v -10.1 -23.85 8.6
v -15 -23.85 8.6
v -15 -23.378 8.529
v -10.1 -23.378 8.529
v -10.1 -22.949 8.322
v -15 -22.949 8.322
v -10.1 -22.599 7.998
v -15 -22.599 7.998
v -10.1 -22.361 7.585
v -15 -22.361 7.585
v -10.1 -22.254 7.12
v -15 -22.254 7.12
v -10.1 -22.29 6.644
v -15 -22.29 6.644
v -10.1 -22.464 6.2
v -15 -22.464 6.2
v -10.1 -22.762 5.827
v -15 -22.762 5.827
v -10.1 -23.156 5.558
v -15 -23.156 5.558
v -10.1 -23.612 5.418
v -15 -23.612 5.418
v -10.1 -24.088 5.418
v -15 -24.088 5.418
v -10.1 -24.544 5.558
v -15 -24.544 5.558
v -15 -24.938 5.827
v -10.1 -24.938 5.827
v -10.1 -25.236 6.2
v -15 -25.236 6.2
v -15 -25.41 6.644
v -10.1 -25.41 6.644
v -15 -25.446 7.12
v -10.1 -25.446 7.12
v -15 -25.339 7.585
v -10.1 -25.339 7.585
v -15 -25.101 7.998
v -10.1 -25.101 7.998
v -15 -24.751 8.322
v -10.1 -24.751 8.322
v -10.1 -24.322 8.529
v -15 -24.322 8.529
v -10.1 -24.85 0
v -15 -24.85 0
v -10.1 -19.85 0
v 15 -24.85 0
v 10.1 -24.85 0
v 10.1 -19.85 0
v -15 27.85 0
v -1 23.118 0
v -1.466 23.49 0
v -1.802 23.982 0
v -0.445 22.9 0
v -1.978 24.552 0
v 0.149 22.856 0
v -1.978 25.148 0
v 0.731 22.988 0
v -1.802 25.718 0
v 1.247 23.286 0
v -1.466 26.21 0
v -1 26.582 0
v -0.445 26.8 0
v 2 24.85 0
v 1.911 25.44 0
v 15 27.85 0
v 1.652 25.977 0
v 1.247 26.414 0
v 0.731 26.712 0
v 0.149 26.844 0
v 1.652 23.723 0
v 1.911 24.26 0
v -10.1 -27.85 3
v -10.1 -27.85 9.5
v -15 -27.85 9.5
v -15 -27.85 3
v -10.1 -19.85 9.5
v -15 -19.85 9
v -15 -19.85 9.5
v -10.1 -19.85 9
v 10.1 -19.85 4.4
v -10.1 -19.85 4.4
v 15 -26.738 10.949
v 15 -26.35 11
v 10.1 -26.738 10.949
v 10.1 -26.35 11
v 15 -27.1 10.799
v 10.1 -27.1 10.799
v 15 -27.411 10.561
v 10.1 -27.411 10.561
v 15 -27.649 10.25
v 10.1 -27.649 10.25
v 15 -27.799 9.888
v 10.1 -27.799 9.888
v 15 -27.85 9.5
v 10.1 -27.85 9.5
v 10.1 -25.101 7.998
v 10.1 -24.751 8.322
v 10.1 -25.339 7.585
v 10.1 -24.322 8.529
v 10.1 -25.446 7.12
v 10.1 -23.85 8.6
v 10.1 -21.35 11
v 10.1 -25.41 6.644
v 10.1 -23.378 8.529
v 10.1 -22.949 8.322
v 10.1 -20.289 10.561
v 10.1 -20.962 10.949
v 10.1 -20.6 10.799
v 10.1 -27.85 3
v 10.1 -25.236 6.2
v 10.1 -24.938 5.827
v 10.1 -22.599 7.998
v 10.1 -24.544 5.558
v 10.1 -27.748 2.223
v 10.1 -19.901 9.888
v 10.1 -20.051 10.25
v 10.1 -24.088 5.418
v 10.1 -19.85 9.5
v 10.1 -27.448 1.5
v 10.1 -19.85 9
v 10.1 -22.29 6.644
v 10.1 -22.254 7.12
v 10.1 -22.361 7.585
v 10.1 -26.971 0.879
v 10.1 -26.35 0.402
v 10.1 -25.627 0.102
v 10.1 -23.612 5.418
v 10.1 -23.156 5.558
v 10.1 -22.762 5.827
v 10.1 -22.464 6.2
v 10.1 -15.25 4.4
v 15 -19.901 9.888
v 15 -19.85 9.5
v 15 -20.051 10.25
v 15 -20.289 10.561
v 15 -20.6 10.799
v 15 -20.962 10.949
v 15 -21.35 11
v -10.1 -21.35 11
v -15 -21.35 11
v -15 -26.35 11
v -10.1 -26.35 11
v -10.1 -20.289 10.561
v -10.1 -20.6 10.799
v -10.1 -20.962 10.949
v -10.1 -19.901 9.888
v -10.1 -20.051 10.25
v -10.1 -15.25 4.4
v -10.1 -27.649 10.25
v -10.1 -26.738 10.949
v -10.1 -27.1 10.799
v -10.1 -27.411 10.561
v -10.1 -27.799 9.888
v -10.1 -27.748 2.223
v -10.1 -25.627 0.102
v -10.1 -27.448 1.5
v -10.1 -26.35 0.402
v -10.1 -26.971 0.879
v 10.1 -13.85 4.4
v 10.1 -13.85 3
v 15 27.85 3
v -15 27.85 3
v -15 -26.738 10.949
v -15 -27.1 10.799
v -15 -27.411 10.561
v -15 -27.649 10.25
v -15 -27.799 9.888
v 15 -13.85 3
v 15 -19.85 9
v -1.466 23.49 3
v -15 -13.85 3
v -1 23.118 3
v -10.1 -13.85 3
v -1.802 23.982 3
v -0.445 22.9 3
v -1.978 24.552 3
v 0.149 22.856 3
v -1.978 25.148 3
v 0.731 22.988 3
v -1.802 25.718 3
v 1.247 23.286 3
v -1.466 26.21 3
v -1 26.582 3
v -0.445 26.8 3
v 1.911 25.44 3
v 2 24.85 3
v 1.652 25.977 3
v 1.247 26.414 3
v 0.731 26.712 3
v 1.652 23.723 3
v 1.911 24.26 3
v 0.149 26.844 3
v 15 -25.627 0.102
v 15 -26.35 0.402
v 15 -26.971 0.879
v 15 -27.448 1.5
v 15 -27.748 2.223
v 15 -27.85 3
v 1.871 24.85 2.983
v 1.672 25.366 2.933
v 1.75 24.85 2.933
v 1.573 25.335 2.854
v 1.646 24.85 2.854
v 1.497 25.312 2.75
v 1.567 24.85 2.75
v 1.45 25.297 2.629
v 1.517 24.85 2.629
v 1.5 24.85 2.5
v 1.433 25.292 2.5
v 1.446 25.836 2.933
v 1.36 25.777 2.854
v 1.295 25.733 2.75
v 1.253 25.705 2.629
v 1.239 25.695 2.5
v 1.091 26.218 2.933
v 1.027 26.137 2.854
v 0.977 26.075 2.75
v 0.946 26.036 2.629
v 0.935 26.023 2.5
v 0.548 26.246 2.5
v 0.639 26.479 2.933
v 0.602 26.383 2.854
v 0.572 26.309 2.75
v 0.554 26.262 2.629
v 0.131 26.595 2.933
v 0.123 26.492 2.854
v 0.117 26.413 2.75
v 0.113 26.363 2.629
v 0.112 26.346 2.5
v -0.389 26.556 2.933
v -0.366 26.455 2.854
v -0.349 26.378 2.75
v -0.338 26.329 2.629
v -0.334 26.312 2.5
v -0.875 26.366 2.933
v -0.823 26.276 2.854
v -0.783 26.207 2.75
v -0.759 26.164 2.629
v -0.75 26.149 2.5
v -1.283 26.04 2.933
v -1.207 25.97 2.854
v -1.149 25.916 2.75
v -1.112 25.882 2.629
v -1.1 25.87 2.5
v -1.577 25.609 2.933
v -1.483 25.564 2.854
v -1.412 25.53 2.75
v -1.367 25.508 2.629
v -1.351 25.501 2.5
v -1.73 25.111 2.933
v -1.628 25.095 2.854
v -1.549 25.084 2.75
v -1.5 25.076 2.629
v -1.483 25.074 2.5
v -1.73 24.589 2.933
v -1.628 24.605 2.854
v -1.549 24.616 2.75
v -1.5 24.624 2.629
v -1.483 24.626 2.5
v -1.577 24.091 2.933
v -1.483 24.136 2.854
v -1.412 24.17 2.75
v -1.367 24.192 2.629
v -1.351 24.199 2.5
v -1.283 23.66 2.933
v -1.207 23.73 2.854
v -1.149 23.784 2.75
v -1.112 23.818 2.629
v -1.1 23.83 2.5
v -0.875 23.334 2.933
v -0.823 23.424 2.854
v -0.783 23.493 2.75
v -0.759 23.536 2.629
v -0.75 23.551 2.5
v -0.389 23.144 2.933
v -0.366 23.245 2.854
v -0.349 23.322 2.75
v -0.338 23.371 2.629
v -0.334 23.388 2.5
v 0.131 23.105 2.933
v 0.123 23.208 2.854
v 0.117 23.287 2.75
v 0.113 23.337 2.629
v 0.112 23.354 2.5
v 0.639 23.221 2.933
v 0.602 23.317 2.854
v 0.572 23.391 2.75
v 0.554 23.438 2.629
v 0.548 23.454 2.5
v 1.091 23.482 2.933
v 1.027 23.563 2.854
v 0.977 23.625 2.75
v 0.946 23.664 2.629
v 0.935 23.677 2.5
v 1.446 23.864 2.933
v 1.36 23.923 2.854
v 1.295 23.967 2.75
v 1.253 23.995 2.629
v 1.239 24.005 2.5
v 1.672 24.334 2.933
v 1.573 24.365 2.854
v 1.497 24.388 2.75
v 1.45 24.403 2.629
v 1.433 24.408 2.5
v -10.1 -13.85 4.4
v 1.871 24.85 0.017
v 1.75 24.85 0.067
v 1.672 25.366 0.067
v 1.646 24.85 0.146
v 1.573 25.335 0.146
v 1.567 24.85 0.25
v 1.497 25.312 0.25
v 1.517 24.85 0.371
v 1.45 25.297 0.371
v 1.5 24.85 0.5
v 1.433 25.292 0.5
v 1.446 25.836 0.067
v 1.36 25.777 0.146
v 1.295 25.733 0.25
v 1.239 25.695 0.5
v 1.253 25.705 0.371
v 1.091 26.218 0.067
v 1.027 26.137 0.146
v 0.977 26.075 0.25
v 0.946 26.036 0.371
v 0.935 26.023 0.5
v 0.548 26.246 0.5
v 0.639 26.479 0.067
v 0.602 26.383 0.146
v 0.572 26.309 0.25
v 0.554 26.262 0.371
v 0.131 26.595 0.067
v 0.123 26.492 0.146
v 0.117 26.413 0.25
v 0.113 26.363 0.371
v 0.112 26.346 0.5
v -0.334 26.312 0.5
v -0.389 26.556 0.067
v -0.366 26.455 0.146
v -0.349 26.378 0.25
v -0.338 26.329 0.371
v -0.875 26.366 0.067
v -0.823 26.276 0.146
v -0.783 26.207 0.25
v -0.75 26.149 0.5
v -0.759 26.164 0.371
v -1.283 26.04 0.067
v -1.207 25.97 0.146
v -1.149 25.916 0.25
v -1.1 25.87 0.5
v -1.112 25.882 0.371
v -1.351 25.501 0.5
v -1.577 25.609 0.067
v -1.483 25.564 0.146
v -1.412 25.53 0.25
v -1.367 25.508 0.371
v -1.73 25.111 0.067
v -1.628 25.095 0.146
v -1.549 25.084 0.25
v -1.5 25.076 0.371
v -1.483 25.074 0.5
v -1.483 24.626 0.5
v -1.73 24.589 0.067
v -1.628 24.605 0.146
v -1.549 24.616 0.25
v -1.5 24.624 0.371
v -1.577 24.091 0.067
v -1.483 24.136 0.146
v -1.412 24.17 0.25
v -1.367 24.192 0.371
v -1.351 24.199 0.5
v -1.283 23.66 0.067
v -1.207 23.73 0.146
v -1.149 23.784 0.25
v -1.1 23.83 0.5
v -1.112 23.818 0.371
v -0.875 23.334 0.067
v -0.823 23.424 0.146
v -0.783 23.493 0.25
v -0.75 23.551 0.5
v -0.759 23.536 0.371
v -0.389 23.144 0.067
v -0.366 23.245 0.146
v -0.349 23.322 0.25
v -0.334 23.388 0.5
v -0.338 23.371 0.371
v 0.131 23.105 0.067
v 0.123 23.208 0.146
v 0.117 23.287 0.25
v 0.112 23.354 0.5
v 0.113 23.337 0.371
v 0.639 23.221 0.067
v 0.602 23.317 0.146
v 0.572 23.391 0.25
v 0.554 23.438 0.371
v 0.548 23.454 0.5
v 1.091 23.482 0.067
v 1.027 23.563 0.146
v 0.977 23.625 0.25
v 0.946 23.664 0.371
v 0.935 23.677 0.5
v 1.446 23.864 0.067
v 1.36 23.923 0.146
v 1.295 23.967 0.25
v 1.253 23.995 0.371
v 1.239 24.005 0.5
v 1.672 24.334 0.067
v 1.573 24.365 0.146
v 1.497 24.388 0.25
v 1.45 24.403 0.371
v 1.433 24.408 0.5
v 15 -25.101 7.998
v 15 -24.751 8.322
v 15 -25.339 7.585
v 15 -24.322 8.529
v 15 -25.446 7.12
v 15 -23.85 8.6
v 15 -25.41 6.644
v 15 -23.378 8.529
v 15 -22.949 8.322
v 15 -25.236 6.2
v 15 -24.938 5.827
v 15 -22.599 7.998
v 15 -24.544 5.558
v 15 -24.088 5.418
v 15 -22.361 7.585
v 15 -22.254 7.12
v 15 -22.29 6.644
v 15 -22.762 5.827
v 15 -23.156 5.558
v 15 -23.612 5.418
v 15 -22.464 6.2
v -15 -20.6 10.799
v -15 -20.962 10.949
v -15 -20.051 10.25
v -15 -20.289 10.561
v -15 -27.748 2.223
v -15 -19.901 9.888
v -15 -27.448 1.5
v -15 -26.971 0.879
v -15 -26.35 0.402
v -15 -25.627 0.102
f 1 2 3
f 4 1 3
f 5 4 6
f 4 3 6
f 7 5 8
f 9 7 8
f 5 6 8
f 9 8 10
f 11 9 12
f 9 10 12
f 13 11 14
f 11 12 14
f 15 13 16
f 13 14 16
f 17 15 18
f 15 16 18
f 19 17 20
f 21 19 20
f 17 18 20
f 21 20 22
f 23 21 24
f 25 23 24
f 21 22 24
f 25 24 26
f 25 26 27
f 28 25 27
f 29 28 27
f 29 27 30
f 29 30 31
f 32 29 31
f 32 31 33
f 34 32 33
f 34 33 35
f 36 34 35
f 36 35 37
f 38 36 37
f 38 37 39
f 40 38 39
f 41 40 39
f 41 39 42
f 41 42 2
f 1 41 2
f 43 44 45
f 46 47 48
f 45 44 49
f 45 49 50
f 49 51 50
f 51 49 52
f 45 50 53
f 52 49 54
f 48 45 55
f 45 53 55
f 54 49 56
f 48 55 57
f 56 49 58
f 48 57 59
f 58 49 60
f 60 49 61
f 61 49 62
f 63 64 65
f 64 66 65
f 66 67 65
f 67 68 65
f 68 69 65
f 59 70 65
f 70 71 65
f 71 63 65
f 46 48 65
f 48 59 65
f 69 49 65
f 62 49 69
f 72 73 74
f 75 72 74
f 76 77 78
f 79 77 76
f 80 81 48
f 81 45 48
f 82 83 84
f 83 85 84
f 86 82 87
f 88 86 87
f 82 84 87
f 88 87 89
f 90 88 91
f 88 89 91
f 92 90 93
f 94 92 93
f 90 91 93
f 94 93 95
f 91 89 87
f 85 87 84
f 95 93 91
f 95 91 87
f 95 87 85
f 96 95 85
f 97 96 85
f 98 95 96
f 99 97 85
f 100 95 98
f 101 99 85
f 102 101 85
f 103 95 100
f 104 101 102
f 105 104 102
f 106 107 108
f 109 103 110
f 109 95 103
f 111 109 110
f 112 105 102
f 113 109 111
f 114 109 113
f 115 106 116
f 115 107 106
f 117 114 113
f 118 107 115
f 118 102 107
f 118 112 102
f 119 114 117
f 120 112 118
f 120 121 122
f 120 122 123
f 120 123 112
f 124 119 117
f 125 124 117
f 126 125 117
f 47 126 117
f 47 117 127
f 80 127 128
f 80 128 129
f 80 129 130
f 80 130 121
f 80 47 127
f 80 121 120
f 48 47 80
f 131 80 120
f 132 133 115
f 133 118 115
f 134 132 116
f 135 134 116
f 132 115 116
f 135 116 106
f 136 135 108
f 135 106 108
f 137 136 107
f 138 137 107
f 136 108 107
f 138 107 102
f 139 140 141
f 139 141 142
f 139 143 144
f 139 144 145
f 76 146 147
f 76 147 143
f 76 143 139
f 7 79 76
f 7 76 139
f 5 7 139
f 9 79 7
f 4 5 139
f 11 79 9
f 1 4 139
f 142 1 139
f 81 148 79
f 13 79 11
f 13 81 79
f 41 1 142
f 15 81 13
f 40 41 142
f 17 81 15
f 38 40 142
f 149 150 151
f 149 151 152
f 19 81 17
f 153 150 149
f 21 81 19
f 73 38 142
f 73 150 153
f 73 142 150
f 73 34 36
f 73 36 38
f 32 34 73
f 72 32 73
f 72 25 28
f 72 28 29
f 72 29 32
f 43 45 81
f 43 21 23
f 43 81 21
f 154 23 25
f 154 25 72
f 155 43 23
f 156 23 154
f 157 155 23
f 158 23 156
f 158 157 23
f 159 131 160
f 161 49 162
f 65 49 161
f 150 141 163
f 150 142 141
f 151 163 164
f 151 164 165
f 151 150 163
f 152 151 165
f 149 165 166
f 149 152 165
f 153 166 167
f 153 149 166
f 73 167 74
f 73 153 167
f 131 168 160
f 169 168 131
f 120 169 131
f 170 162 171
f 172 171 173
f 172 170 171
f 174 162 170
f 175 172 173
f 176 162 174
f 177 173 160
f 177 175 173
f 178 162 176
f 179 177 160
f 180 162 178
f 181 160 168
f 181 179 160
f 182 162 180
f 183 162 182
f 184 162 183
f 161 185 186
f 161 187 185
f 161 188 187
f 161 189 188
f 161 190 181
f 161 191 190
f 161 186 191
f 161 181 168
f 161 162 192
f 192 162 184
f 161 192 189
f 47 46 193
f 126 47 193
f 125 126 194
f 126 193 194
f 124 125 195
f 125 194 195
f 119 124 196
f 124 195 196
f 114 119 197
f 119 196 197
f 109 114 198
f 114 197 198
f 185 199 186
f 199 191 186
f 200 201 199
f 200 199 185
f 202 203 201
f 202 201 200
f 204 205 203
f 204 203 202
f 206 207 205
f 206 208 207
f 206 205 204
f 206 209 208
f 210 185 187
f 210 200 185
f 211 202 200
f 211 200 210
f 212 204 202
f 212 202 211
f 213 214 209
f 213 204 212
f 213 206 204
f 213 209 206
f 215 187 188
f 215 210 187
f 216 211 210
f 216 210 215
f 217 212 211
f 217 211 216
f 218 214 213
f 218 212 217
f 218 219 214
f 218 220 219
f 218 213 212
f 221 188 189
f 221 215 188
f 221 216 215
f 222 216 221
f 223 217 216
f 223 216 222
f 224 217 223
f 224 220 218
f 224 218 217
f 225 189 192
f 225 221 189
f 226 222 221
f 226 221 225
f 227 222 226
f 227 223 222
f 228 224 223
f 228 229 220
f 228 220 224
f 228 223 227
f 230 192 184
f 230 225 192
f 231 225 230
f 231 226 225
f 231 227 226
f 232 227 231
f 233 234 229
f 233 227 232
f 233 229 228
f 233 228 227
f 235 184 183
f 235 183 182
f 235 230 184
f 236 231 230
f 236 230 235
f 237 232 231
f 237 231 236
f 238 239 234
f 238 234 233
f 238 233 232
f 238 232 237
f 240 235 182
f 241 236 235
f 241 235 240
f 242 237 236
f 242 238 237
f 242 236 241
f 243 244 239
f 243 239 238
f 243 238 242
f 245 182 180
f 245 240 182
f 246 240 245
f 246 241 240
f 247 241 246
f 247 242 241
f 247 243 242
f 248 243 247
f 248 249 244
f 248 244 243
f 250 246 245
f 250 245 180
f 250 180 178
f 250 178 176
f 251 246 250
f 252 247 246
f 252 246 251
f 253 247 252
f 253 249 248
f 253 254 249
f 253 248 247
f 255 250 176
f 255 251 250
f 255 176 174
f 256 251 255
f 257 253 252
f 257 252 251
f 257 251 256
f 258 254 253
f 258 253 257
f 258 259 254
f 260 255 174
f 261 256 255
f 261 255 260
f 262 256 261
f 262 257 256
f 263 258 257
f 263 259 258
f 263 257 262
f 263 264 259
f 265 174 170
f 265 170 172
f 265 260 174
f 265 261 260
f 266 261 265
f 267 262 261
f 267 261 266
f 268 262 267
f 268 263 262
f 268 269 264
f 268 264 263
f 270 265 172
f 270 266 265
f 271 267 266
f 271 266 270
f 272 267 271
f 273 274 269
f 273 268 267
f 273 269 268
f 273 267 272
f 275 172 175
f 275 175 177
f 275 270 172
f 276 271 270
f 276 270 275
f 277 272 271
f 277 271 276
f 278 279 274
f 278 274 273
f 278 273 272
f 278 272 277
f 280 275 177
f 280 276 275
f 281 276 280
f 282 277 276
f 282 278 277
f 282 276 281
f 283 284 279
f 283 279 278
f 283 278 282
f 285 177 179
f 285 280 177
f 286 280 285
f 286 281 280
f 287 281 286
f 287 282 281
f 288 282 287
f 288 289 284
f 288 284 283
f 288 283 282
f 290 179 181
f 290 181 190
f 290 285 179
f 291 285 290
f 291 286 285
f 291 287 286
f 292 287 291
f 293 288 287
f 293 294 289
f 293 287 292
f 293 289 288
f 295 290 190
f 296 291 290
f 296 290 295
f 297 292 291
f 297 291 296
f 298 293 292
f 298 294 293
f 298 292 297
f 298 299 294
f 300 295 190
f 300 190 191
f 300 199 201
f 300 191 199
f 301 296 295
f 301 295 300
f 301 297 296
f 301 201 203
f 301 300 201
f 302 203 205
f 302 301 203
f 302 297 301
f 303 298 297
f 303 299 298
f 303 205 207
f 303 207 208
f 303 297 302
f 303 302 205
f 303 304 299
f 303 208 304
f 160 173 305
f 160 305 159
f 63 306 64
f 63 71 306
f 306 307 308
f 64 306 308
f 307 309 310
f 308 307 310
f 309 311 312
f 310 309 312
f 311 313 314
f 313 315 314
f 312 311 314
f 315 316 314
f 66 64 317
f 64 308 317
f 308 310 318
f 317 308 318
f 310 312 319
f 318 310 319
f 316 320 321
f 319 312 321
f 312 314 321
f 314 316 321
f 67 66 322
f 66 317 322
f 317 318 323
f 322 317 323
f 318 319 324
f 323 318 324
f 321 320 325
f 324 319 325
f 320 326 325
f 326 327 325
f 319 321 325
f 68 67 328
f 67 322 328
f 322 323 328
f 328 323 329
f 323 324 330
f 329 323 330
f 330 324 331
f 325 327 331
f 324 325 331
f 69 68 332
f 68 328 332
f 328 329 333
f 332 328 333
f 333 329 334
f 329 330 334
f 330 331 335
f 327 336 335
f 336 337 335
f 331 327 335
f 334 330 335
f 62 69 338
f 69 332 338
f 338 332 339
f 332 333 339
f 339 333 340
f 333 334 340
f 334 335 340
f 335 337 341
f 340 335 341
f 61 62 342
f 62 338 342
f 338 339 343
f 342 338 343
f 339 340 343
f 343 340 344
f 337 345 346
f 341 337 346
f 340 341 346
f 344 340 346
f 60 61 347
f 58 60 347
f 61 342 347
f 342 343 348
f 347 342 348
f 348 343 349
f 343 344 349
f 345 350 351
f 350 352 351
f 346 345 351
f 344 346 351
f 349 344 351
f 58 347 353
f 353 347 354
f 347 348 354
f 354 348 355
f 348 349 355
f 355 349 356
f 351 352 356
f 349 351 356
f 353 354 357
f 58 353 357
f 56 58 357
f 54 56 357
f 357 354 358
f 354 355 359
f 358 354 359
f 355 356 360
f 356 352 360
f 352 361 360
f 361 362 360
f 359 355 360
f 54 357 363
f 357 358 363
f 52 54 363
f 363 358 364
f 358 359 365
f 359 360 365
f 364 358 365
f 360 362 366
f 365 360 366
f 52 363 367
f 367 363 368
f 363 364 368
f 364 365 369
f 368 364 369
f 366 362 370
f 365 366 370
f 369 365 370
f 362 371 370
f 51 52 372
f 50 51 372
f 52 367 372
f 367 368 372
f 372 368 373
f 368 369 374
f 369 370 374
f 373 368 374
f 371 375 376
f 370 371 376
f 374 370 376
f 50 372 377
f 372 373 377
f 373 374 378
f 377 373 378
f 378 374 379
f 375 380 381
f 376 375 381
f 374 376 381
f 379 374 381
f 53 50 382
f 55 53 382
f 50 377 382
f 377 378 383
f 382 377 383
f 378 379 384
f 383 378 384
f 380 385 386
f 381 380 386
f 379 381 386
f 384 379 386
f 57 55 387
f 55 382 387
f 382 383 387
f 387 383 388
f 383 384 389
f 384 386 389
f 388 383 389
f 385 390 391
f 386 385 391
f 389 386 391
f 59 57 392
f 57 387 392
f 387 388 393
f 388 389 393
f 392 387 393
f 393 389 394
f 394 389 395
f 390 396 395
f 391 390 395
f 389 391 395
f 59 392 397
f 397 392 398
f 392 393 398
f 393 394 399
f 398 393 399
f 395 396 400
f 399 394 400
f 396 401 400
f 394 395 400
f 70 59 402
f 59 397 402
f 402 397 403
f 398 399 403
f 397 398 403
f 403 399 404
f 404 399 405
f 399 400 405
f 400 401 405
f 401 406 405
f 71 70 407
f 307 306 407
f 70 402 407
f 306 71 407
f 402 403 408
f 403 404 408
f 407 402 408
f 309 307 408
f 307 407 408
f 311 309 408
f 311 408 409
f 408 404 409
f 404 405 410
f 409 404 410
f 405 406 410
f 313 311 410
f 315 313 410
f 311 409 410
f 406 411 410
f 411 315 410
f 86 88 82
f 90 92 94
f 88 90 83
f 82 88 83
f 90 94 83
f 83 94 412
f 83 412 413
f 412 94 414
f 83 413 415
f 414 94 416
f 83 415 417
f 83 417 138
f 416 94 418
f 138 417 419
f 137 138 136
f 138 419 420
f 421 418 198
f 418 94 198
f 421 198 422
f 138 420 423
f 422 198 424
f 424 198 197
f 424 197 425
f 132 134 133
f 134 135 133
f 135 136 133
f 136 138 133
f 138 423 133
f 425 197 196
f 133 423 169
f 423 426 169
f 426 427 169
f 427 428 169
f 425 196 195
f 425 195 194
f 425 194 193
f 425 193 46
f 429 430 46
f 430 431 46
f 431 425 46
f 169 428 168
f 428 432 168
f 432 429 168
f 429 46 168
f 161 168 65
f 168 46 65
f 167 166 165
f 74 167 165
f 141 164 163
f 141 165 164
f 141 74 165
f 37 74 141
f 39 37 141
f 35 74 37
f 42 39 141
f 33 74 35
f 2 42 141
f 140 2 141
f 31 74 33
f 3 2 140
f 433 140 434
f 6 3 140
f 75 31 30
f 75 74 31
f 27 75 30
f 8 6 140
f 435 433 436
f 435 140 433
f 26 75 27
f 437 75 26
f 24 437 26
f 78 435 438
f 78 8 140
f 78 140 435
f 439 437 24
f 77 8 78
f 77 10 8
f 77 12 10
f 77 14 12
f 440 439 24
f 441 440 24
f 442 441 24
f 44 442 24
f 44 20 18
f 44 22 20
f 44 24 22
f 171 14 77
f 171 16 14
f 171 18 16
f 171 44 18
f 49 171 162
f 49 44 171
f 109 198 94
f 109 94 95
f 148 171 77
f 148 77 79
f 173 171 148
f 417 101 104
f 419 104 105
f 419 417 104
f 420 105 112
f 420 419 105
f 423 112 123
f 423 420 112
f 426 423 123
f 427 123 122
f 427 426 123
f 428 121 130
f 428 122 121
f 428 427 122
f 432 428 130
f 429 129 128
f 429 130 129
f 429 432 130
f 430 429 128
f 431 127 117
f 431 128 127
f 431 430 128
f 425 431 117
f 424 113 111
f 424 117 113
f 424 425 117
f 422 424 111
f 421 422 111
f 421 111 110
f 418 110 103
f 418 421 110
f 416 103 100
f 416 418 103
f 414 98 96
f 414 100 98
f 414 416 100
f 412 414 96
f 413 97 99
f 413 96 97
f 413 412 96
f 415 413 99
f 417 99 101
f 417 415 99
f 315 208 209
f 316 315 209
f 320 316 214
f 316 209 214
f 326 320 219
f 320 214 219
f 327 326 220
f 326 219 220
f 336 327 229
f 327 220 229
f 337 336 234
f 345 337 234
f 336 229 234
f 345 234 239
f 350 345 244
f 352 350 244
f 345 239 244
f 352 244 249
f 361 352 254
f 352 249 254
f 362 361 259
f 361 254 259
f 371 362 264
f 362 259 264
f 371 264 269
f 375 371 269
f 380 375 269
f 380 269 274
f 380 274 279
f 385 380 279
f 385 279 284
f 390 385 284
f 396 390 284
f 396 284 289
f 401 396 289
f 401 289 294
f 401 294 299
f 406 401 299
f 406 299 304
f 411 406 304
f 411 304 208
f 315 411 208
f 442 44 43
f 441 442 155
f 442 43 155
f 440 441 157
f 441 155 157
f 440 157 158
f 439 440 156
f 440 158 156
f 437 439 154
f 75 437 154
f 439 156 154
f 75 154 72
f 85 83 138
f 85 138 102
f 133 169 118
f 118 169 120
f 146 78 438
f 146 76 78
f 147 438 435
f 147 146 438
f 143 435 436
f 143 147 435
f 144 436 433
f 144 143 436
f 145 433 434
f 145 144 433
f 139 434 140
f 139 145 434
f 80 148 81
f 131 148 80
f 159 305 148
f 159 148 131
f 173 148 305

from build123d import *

# Parameters (mm, degrees)
SKETCH1_W               = 30
SKETCH1_H               = 55.7
BOSS_EXTRUDE1_DEPTH     = 3
SKETCH2_W               = 4.9
SKETCH2_H               = 8
BOSS_EXTRUDE2_DEPTH     = 8
SKETCH3_R               = 1.6
CUT_EXTRUDE1_DEPTH      = 43.386583962
SKETCH4_R               = 1.5
CUT_EXTRUDE2_DEPTH      = 10
FILLET3_R               = 0.5
FILLET4_R               = 3
CUT_EXTRUDE4_DEPTH      = 33.628553446
CUT_EXTRUDE4_DEPTH_BACK = 10
FILLET5_R               = 1.5
CHAMFER1_SIZE           = 6
SKETCH6_W               = 20.2
SKETCH6_H               = 6
BOSS_EXTRUDE3_DEPTH     = 1.4


with BuildPart() as part:
    # Sketch1 → Boss-Extrude1 (new body)
    with BuildSketch(Plane.XY):
        Rectangle(SKETCH1_W, SKETCH1_H)
    extrude(amount=BOSS_EXTRUDE1_DEPTH)

    # Sketch2 → Boss-Extrude2 (add)
    with BuildSketch(Plane.XY.offset(3)):
        with Locations((-12.55, -23.85)):
            Rectangle(SKETCH2_W, SKETCH2_H)
    boss_extrude2 = extrude(amount=BOSS_EXTRUDE2_DEPTH)

    # Sketch3 → Cut-Extrude1 (cut, through all)
    with BuildSketch(Plane.ZY.offset(15)):
        with Locations((7, -23.85)):
            Circle(SKETCH3_R)
    cut_extrude1 = extrude(amount=-CUT_EXTRUDE1_DEPTH, mode=Mode.SUBTRACT)

    # Mirror1: Boss-Extrude2, Cut-Extrude1 across plane
    add(boss_extrude2.mirror(Plane(origin=(0, 0, 0), x_dir=(0, 0, 1), z_dir=(1, 0, 0))))
    add(cut_extrude1.mirror(Plane(origin=(0, 0, 0), x_dir=(0, 0, 1), z_dir=(1, 0, 0))), mode=Mode.SUBTRACT)

    # Sketch4 → Cut-Extrude2 (cut)
    with BuildSketch(Plane.XY.offset(3)):
        with Locations((0, 24.85)):
            Circle(SKETCH4_R)
    extrude(amount=-CUT_EXTRUDE2_DEPTH, mode=Mode.SUBTRACT)

    # Fillet3
    fillet3_edges = [part.edges().sort_by_distance(p)[0] for p in [
        (-1.5, 24.85, 0),
        (-1.5, 24.85, 3),
    ]]
    fillet(fillet3_edges, radius=FILLET3_R)

    # Fillet4
    fillet4_edges = [part.edges().sort_by_distance(p)[0] for p in [
        (0, -27.85, 0),
    ]]
    fillet(fillet4_edges, radius=FILLET4_R - 0.0001)  # a hair under: the kernel refuses the full size

    # Sketch5 → Cut-Extrude4 (cut, two sides: drawn at the far end of the back side and taken through both)
    with BuildSketch(Plane.XY.offset(3).offset(-CUT_EXTRUDE4_DEPTH_BACK)):
        Polygon((10.1, -27.85), (10.1, -19.85), (-10.1, -19.85), (-10.1, -27.85), (-10.1, -30.330641118), (10.1, -30.330641118), align=None)
    extrude(amount=CUT_EXTRUDE4_DEPTH + CUT_EXTRUDE4_DEPTH_BACK, mode=Mode.SUBTRACT)

    # Fillet5
    fillet5_edges = [part.edges().sort_by_distance(p)[0] for p in [
        (-12.55, -27.85, 11),
        (-12.55, -19.85, 11),
        (12.55, -19.85, 11),
        (12.55, -27.85, 11),
    ]]
    fillet(fillet5_edges, radius=FILLET5_R)

    # Chamfer1
    chamfer1_edges = [part.edges().sort_by_distance(p)[0] for p in [
        (-12.55, -19.85, 3),
        (12.55, -19.85, 3),
    ]]
    chamfer(chamfer1_edges, length=CHAMFER1_SIZE)

    # Sketch6 → Boss-Extrude3 (add)
    with BuildSketch(Plane.XY.offset(3)):
        with Locations((0, -16.85)):
            Rectangle(SKETCH6_W, SKETCH6_H)
    extrude(amount=BOSS_EXTRUDE3_DEPTH)


solid = part.part
